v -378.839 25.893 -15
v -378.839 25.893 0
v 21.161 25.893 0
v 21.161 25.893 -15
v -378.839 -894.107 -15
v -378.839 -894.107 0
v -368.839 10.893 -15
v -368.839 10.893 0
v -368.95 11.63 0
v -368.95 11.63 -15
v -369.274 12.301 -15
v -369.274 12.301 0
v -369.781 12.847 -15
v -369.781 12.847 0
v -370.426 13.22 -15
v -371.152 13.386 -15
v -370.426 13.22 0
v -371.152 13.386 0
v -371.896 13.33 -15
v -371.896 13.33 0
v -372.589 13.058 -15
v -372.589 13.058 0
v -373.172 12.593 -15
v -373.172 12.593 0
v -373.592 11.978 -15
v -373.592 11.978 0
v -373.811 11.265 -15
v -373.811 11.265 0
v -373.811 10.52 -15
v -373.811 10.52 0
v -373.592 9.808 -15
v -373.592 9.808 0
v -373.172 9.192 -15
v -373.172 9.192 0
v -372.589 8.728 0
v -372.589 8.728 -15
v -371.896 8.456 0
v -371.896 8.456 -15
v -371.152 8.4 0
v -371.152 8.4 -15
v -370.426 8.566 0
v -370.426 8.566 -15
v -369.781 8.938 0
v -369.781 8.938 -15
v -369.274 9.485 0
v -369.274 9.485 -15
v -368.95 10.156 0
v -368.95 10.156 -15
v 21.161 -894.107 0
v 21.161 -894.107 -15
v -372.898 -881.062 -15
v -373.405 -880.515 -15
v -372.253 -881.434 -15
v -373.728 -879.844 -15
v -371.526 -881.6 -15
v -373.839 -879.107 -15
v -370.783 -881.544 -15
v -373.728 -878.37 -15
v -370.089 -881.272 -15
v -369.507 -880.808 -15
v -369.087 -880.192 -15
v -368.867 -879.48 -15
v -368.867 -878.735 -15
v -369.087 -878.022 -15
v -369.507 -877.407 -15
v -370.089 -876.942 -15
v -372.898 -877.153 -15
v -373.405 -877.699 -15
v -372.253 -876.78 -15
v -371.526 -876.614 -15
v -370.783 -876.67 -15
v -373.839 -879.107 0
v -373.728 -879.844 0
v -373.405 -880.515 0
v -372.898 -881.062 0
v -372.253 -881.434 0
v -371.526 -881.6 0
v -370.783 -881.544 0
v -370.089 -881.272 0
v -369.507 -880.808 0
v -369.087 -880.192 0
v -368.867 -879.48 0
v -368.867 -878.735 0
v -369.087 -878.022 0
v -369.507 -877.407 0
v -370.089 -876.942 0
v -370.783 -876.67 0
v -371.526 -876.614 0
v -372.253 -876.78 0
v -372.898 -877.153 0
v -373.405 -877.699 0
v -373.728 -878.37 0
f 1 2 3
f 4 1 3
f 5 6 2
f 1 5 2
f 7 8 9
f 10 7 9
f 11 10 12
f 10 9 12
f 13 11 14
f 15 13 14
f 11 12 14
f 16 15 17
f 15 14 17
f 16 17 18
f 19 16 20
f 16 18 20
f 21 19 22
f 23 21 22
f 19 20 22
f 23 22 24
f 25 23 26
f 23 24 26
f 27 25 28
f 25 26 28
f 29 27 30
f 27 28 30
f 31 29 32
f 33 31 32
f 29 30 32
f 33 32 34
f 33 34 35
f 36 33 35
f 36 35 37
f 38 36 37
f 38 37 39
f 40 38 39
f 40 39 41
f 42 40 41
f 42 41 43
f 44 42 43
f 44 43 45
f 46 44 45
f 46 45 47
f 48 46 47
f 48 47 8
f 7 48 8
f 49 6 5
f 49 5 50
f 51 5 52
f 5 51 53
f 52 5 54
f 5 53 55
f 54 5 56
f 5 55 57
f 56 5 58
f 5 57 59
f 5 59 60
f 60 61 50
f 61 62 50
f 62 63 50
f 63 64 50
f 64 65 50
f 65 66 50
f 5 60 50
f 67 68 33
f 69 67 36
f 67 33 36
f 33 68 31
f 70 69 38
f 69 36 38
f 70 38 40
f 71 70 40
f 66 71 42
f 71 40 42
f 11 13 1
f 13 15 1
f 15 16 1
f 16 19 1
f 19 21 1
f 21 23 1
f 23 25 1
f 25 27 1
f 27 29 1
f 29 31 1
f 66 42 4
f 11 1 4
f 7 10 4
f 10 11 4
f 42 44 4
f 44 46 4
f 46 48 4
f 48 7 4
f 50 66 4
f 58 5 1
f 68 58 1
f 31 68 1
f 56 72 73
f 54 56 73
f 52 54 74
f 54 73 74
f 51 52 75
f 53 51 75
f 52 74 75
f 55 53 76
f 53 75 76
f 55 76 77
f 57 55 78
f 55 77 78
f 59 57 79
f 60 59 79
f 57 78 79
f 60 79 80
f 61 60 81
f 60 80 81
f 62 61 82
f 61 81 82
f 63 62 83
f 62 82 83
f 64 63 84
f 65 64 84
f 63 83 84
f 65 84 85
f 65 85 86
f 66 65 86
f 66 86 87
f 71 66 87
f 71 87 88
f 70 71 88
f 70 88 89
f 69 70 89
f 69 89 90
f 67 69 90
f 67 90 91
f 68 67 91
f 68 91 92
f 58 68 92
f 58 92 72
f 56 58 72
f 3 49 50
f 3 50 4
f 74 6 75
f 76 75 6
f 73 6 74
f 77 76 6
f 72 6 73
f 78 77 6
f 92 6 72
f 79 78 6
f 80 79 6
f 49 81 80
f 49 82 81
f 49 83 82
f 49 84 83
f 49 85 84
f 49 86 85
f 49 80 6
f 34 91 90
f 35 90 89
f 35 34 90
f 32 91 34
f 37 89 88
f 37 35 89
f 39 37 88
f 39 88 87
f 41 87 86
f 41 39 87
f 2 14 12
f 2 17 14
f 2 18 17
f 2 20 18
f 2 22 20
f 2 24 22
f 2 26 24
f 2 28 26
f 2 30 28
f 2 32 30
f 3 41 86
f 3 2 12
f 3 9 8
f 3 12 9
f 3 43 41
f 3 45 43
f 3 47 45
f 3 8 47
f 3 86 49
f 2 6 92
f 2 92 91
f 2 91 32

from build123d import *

# Parameters (mm, degrees)
CROQUIS1_W              = 400
CROQUIS1_H              = 920
SALIENTE_EXTRUIR1_DEPTH = 15
CROQUIS3_R              = 2.5
CORTAR_EXTRUIR1_DEPTH   = 972.170318383


with BuildPart() as part:
    # Croquis1 → Saliente-Extruir1 (new body)
    with BuildSketch(Plane.XY):
        with Locations((-178.839285714, -434.107142857)):
            Rectangle(CROQUIS1_W, CROQUIS1_H)
    extrude(amount=-SALIENTE_EXTRUIR1_DEPTH)

    # Croquis3 → Cortar-Extruir1 (cut, through all)
    with BuildSketch(Plane.XY):
        with Locations((-371.339285714, 10.892857143)):
            Circle(CROQUIS3_R)
        with Locations(Location((-371.339285714, -879.107142857, 0), (0, 0, 180))):
            Circle(CROQUIS3_R)
    extrude(amount=-CORTAR_EXTRUIR1_DEPTH, mode=Mode.SUBTRACT)


solid = part.part
